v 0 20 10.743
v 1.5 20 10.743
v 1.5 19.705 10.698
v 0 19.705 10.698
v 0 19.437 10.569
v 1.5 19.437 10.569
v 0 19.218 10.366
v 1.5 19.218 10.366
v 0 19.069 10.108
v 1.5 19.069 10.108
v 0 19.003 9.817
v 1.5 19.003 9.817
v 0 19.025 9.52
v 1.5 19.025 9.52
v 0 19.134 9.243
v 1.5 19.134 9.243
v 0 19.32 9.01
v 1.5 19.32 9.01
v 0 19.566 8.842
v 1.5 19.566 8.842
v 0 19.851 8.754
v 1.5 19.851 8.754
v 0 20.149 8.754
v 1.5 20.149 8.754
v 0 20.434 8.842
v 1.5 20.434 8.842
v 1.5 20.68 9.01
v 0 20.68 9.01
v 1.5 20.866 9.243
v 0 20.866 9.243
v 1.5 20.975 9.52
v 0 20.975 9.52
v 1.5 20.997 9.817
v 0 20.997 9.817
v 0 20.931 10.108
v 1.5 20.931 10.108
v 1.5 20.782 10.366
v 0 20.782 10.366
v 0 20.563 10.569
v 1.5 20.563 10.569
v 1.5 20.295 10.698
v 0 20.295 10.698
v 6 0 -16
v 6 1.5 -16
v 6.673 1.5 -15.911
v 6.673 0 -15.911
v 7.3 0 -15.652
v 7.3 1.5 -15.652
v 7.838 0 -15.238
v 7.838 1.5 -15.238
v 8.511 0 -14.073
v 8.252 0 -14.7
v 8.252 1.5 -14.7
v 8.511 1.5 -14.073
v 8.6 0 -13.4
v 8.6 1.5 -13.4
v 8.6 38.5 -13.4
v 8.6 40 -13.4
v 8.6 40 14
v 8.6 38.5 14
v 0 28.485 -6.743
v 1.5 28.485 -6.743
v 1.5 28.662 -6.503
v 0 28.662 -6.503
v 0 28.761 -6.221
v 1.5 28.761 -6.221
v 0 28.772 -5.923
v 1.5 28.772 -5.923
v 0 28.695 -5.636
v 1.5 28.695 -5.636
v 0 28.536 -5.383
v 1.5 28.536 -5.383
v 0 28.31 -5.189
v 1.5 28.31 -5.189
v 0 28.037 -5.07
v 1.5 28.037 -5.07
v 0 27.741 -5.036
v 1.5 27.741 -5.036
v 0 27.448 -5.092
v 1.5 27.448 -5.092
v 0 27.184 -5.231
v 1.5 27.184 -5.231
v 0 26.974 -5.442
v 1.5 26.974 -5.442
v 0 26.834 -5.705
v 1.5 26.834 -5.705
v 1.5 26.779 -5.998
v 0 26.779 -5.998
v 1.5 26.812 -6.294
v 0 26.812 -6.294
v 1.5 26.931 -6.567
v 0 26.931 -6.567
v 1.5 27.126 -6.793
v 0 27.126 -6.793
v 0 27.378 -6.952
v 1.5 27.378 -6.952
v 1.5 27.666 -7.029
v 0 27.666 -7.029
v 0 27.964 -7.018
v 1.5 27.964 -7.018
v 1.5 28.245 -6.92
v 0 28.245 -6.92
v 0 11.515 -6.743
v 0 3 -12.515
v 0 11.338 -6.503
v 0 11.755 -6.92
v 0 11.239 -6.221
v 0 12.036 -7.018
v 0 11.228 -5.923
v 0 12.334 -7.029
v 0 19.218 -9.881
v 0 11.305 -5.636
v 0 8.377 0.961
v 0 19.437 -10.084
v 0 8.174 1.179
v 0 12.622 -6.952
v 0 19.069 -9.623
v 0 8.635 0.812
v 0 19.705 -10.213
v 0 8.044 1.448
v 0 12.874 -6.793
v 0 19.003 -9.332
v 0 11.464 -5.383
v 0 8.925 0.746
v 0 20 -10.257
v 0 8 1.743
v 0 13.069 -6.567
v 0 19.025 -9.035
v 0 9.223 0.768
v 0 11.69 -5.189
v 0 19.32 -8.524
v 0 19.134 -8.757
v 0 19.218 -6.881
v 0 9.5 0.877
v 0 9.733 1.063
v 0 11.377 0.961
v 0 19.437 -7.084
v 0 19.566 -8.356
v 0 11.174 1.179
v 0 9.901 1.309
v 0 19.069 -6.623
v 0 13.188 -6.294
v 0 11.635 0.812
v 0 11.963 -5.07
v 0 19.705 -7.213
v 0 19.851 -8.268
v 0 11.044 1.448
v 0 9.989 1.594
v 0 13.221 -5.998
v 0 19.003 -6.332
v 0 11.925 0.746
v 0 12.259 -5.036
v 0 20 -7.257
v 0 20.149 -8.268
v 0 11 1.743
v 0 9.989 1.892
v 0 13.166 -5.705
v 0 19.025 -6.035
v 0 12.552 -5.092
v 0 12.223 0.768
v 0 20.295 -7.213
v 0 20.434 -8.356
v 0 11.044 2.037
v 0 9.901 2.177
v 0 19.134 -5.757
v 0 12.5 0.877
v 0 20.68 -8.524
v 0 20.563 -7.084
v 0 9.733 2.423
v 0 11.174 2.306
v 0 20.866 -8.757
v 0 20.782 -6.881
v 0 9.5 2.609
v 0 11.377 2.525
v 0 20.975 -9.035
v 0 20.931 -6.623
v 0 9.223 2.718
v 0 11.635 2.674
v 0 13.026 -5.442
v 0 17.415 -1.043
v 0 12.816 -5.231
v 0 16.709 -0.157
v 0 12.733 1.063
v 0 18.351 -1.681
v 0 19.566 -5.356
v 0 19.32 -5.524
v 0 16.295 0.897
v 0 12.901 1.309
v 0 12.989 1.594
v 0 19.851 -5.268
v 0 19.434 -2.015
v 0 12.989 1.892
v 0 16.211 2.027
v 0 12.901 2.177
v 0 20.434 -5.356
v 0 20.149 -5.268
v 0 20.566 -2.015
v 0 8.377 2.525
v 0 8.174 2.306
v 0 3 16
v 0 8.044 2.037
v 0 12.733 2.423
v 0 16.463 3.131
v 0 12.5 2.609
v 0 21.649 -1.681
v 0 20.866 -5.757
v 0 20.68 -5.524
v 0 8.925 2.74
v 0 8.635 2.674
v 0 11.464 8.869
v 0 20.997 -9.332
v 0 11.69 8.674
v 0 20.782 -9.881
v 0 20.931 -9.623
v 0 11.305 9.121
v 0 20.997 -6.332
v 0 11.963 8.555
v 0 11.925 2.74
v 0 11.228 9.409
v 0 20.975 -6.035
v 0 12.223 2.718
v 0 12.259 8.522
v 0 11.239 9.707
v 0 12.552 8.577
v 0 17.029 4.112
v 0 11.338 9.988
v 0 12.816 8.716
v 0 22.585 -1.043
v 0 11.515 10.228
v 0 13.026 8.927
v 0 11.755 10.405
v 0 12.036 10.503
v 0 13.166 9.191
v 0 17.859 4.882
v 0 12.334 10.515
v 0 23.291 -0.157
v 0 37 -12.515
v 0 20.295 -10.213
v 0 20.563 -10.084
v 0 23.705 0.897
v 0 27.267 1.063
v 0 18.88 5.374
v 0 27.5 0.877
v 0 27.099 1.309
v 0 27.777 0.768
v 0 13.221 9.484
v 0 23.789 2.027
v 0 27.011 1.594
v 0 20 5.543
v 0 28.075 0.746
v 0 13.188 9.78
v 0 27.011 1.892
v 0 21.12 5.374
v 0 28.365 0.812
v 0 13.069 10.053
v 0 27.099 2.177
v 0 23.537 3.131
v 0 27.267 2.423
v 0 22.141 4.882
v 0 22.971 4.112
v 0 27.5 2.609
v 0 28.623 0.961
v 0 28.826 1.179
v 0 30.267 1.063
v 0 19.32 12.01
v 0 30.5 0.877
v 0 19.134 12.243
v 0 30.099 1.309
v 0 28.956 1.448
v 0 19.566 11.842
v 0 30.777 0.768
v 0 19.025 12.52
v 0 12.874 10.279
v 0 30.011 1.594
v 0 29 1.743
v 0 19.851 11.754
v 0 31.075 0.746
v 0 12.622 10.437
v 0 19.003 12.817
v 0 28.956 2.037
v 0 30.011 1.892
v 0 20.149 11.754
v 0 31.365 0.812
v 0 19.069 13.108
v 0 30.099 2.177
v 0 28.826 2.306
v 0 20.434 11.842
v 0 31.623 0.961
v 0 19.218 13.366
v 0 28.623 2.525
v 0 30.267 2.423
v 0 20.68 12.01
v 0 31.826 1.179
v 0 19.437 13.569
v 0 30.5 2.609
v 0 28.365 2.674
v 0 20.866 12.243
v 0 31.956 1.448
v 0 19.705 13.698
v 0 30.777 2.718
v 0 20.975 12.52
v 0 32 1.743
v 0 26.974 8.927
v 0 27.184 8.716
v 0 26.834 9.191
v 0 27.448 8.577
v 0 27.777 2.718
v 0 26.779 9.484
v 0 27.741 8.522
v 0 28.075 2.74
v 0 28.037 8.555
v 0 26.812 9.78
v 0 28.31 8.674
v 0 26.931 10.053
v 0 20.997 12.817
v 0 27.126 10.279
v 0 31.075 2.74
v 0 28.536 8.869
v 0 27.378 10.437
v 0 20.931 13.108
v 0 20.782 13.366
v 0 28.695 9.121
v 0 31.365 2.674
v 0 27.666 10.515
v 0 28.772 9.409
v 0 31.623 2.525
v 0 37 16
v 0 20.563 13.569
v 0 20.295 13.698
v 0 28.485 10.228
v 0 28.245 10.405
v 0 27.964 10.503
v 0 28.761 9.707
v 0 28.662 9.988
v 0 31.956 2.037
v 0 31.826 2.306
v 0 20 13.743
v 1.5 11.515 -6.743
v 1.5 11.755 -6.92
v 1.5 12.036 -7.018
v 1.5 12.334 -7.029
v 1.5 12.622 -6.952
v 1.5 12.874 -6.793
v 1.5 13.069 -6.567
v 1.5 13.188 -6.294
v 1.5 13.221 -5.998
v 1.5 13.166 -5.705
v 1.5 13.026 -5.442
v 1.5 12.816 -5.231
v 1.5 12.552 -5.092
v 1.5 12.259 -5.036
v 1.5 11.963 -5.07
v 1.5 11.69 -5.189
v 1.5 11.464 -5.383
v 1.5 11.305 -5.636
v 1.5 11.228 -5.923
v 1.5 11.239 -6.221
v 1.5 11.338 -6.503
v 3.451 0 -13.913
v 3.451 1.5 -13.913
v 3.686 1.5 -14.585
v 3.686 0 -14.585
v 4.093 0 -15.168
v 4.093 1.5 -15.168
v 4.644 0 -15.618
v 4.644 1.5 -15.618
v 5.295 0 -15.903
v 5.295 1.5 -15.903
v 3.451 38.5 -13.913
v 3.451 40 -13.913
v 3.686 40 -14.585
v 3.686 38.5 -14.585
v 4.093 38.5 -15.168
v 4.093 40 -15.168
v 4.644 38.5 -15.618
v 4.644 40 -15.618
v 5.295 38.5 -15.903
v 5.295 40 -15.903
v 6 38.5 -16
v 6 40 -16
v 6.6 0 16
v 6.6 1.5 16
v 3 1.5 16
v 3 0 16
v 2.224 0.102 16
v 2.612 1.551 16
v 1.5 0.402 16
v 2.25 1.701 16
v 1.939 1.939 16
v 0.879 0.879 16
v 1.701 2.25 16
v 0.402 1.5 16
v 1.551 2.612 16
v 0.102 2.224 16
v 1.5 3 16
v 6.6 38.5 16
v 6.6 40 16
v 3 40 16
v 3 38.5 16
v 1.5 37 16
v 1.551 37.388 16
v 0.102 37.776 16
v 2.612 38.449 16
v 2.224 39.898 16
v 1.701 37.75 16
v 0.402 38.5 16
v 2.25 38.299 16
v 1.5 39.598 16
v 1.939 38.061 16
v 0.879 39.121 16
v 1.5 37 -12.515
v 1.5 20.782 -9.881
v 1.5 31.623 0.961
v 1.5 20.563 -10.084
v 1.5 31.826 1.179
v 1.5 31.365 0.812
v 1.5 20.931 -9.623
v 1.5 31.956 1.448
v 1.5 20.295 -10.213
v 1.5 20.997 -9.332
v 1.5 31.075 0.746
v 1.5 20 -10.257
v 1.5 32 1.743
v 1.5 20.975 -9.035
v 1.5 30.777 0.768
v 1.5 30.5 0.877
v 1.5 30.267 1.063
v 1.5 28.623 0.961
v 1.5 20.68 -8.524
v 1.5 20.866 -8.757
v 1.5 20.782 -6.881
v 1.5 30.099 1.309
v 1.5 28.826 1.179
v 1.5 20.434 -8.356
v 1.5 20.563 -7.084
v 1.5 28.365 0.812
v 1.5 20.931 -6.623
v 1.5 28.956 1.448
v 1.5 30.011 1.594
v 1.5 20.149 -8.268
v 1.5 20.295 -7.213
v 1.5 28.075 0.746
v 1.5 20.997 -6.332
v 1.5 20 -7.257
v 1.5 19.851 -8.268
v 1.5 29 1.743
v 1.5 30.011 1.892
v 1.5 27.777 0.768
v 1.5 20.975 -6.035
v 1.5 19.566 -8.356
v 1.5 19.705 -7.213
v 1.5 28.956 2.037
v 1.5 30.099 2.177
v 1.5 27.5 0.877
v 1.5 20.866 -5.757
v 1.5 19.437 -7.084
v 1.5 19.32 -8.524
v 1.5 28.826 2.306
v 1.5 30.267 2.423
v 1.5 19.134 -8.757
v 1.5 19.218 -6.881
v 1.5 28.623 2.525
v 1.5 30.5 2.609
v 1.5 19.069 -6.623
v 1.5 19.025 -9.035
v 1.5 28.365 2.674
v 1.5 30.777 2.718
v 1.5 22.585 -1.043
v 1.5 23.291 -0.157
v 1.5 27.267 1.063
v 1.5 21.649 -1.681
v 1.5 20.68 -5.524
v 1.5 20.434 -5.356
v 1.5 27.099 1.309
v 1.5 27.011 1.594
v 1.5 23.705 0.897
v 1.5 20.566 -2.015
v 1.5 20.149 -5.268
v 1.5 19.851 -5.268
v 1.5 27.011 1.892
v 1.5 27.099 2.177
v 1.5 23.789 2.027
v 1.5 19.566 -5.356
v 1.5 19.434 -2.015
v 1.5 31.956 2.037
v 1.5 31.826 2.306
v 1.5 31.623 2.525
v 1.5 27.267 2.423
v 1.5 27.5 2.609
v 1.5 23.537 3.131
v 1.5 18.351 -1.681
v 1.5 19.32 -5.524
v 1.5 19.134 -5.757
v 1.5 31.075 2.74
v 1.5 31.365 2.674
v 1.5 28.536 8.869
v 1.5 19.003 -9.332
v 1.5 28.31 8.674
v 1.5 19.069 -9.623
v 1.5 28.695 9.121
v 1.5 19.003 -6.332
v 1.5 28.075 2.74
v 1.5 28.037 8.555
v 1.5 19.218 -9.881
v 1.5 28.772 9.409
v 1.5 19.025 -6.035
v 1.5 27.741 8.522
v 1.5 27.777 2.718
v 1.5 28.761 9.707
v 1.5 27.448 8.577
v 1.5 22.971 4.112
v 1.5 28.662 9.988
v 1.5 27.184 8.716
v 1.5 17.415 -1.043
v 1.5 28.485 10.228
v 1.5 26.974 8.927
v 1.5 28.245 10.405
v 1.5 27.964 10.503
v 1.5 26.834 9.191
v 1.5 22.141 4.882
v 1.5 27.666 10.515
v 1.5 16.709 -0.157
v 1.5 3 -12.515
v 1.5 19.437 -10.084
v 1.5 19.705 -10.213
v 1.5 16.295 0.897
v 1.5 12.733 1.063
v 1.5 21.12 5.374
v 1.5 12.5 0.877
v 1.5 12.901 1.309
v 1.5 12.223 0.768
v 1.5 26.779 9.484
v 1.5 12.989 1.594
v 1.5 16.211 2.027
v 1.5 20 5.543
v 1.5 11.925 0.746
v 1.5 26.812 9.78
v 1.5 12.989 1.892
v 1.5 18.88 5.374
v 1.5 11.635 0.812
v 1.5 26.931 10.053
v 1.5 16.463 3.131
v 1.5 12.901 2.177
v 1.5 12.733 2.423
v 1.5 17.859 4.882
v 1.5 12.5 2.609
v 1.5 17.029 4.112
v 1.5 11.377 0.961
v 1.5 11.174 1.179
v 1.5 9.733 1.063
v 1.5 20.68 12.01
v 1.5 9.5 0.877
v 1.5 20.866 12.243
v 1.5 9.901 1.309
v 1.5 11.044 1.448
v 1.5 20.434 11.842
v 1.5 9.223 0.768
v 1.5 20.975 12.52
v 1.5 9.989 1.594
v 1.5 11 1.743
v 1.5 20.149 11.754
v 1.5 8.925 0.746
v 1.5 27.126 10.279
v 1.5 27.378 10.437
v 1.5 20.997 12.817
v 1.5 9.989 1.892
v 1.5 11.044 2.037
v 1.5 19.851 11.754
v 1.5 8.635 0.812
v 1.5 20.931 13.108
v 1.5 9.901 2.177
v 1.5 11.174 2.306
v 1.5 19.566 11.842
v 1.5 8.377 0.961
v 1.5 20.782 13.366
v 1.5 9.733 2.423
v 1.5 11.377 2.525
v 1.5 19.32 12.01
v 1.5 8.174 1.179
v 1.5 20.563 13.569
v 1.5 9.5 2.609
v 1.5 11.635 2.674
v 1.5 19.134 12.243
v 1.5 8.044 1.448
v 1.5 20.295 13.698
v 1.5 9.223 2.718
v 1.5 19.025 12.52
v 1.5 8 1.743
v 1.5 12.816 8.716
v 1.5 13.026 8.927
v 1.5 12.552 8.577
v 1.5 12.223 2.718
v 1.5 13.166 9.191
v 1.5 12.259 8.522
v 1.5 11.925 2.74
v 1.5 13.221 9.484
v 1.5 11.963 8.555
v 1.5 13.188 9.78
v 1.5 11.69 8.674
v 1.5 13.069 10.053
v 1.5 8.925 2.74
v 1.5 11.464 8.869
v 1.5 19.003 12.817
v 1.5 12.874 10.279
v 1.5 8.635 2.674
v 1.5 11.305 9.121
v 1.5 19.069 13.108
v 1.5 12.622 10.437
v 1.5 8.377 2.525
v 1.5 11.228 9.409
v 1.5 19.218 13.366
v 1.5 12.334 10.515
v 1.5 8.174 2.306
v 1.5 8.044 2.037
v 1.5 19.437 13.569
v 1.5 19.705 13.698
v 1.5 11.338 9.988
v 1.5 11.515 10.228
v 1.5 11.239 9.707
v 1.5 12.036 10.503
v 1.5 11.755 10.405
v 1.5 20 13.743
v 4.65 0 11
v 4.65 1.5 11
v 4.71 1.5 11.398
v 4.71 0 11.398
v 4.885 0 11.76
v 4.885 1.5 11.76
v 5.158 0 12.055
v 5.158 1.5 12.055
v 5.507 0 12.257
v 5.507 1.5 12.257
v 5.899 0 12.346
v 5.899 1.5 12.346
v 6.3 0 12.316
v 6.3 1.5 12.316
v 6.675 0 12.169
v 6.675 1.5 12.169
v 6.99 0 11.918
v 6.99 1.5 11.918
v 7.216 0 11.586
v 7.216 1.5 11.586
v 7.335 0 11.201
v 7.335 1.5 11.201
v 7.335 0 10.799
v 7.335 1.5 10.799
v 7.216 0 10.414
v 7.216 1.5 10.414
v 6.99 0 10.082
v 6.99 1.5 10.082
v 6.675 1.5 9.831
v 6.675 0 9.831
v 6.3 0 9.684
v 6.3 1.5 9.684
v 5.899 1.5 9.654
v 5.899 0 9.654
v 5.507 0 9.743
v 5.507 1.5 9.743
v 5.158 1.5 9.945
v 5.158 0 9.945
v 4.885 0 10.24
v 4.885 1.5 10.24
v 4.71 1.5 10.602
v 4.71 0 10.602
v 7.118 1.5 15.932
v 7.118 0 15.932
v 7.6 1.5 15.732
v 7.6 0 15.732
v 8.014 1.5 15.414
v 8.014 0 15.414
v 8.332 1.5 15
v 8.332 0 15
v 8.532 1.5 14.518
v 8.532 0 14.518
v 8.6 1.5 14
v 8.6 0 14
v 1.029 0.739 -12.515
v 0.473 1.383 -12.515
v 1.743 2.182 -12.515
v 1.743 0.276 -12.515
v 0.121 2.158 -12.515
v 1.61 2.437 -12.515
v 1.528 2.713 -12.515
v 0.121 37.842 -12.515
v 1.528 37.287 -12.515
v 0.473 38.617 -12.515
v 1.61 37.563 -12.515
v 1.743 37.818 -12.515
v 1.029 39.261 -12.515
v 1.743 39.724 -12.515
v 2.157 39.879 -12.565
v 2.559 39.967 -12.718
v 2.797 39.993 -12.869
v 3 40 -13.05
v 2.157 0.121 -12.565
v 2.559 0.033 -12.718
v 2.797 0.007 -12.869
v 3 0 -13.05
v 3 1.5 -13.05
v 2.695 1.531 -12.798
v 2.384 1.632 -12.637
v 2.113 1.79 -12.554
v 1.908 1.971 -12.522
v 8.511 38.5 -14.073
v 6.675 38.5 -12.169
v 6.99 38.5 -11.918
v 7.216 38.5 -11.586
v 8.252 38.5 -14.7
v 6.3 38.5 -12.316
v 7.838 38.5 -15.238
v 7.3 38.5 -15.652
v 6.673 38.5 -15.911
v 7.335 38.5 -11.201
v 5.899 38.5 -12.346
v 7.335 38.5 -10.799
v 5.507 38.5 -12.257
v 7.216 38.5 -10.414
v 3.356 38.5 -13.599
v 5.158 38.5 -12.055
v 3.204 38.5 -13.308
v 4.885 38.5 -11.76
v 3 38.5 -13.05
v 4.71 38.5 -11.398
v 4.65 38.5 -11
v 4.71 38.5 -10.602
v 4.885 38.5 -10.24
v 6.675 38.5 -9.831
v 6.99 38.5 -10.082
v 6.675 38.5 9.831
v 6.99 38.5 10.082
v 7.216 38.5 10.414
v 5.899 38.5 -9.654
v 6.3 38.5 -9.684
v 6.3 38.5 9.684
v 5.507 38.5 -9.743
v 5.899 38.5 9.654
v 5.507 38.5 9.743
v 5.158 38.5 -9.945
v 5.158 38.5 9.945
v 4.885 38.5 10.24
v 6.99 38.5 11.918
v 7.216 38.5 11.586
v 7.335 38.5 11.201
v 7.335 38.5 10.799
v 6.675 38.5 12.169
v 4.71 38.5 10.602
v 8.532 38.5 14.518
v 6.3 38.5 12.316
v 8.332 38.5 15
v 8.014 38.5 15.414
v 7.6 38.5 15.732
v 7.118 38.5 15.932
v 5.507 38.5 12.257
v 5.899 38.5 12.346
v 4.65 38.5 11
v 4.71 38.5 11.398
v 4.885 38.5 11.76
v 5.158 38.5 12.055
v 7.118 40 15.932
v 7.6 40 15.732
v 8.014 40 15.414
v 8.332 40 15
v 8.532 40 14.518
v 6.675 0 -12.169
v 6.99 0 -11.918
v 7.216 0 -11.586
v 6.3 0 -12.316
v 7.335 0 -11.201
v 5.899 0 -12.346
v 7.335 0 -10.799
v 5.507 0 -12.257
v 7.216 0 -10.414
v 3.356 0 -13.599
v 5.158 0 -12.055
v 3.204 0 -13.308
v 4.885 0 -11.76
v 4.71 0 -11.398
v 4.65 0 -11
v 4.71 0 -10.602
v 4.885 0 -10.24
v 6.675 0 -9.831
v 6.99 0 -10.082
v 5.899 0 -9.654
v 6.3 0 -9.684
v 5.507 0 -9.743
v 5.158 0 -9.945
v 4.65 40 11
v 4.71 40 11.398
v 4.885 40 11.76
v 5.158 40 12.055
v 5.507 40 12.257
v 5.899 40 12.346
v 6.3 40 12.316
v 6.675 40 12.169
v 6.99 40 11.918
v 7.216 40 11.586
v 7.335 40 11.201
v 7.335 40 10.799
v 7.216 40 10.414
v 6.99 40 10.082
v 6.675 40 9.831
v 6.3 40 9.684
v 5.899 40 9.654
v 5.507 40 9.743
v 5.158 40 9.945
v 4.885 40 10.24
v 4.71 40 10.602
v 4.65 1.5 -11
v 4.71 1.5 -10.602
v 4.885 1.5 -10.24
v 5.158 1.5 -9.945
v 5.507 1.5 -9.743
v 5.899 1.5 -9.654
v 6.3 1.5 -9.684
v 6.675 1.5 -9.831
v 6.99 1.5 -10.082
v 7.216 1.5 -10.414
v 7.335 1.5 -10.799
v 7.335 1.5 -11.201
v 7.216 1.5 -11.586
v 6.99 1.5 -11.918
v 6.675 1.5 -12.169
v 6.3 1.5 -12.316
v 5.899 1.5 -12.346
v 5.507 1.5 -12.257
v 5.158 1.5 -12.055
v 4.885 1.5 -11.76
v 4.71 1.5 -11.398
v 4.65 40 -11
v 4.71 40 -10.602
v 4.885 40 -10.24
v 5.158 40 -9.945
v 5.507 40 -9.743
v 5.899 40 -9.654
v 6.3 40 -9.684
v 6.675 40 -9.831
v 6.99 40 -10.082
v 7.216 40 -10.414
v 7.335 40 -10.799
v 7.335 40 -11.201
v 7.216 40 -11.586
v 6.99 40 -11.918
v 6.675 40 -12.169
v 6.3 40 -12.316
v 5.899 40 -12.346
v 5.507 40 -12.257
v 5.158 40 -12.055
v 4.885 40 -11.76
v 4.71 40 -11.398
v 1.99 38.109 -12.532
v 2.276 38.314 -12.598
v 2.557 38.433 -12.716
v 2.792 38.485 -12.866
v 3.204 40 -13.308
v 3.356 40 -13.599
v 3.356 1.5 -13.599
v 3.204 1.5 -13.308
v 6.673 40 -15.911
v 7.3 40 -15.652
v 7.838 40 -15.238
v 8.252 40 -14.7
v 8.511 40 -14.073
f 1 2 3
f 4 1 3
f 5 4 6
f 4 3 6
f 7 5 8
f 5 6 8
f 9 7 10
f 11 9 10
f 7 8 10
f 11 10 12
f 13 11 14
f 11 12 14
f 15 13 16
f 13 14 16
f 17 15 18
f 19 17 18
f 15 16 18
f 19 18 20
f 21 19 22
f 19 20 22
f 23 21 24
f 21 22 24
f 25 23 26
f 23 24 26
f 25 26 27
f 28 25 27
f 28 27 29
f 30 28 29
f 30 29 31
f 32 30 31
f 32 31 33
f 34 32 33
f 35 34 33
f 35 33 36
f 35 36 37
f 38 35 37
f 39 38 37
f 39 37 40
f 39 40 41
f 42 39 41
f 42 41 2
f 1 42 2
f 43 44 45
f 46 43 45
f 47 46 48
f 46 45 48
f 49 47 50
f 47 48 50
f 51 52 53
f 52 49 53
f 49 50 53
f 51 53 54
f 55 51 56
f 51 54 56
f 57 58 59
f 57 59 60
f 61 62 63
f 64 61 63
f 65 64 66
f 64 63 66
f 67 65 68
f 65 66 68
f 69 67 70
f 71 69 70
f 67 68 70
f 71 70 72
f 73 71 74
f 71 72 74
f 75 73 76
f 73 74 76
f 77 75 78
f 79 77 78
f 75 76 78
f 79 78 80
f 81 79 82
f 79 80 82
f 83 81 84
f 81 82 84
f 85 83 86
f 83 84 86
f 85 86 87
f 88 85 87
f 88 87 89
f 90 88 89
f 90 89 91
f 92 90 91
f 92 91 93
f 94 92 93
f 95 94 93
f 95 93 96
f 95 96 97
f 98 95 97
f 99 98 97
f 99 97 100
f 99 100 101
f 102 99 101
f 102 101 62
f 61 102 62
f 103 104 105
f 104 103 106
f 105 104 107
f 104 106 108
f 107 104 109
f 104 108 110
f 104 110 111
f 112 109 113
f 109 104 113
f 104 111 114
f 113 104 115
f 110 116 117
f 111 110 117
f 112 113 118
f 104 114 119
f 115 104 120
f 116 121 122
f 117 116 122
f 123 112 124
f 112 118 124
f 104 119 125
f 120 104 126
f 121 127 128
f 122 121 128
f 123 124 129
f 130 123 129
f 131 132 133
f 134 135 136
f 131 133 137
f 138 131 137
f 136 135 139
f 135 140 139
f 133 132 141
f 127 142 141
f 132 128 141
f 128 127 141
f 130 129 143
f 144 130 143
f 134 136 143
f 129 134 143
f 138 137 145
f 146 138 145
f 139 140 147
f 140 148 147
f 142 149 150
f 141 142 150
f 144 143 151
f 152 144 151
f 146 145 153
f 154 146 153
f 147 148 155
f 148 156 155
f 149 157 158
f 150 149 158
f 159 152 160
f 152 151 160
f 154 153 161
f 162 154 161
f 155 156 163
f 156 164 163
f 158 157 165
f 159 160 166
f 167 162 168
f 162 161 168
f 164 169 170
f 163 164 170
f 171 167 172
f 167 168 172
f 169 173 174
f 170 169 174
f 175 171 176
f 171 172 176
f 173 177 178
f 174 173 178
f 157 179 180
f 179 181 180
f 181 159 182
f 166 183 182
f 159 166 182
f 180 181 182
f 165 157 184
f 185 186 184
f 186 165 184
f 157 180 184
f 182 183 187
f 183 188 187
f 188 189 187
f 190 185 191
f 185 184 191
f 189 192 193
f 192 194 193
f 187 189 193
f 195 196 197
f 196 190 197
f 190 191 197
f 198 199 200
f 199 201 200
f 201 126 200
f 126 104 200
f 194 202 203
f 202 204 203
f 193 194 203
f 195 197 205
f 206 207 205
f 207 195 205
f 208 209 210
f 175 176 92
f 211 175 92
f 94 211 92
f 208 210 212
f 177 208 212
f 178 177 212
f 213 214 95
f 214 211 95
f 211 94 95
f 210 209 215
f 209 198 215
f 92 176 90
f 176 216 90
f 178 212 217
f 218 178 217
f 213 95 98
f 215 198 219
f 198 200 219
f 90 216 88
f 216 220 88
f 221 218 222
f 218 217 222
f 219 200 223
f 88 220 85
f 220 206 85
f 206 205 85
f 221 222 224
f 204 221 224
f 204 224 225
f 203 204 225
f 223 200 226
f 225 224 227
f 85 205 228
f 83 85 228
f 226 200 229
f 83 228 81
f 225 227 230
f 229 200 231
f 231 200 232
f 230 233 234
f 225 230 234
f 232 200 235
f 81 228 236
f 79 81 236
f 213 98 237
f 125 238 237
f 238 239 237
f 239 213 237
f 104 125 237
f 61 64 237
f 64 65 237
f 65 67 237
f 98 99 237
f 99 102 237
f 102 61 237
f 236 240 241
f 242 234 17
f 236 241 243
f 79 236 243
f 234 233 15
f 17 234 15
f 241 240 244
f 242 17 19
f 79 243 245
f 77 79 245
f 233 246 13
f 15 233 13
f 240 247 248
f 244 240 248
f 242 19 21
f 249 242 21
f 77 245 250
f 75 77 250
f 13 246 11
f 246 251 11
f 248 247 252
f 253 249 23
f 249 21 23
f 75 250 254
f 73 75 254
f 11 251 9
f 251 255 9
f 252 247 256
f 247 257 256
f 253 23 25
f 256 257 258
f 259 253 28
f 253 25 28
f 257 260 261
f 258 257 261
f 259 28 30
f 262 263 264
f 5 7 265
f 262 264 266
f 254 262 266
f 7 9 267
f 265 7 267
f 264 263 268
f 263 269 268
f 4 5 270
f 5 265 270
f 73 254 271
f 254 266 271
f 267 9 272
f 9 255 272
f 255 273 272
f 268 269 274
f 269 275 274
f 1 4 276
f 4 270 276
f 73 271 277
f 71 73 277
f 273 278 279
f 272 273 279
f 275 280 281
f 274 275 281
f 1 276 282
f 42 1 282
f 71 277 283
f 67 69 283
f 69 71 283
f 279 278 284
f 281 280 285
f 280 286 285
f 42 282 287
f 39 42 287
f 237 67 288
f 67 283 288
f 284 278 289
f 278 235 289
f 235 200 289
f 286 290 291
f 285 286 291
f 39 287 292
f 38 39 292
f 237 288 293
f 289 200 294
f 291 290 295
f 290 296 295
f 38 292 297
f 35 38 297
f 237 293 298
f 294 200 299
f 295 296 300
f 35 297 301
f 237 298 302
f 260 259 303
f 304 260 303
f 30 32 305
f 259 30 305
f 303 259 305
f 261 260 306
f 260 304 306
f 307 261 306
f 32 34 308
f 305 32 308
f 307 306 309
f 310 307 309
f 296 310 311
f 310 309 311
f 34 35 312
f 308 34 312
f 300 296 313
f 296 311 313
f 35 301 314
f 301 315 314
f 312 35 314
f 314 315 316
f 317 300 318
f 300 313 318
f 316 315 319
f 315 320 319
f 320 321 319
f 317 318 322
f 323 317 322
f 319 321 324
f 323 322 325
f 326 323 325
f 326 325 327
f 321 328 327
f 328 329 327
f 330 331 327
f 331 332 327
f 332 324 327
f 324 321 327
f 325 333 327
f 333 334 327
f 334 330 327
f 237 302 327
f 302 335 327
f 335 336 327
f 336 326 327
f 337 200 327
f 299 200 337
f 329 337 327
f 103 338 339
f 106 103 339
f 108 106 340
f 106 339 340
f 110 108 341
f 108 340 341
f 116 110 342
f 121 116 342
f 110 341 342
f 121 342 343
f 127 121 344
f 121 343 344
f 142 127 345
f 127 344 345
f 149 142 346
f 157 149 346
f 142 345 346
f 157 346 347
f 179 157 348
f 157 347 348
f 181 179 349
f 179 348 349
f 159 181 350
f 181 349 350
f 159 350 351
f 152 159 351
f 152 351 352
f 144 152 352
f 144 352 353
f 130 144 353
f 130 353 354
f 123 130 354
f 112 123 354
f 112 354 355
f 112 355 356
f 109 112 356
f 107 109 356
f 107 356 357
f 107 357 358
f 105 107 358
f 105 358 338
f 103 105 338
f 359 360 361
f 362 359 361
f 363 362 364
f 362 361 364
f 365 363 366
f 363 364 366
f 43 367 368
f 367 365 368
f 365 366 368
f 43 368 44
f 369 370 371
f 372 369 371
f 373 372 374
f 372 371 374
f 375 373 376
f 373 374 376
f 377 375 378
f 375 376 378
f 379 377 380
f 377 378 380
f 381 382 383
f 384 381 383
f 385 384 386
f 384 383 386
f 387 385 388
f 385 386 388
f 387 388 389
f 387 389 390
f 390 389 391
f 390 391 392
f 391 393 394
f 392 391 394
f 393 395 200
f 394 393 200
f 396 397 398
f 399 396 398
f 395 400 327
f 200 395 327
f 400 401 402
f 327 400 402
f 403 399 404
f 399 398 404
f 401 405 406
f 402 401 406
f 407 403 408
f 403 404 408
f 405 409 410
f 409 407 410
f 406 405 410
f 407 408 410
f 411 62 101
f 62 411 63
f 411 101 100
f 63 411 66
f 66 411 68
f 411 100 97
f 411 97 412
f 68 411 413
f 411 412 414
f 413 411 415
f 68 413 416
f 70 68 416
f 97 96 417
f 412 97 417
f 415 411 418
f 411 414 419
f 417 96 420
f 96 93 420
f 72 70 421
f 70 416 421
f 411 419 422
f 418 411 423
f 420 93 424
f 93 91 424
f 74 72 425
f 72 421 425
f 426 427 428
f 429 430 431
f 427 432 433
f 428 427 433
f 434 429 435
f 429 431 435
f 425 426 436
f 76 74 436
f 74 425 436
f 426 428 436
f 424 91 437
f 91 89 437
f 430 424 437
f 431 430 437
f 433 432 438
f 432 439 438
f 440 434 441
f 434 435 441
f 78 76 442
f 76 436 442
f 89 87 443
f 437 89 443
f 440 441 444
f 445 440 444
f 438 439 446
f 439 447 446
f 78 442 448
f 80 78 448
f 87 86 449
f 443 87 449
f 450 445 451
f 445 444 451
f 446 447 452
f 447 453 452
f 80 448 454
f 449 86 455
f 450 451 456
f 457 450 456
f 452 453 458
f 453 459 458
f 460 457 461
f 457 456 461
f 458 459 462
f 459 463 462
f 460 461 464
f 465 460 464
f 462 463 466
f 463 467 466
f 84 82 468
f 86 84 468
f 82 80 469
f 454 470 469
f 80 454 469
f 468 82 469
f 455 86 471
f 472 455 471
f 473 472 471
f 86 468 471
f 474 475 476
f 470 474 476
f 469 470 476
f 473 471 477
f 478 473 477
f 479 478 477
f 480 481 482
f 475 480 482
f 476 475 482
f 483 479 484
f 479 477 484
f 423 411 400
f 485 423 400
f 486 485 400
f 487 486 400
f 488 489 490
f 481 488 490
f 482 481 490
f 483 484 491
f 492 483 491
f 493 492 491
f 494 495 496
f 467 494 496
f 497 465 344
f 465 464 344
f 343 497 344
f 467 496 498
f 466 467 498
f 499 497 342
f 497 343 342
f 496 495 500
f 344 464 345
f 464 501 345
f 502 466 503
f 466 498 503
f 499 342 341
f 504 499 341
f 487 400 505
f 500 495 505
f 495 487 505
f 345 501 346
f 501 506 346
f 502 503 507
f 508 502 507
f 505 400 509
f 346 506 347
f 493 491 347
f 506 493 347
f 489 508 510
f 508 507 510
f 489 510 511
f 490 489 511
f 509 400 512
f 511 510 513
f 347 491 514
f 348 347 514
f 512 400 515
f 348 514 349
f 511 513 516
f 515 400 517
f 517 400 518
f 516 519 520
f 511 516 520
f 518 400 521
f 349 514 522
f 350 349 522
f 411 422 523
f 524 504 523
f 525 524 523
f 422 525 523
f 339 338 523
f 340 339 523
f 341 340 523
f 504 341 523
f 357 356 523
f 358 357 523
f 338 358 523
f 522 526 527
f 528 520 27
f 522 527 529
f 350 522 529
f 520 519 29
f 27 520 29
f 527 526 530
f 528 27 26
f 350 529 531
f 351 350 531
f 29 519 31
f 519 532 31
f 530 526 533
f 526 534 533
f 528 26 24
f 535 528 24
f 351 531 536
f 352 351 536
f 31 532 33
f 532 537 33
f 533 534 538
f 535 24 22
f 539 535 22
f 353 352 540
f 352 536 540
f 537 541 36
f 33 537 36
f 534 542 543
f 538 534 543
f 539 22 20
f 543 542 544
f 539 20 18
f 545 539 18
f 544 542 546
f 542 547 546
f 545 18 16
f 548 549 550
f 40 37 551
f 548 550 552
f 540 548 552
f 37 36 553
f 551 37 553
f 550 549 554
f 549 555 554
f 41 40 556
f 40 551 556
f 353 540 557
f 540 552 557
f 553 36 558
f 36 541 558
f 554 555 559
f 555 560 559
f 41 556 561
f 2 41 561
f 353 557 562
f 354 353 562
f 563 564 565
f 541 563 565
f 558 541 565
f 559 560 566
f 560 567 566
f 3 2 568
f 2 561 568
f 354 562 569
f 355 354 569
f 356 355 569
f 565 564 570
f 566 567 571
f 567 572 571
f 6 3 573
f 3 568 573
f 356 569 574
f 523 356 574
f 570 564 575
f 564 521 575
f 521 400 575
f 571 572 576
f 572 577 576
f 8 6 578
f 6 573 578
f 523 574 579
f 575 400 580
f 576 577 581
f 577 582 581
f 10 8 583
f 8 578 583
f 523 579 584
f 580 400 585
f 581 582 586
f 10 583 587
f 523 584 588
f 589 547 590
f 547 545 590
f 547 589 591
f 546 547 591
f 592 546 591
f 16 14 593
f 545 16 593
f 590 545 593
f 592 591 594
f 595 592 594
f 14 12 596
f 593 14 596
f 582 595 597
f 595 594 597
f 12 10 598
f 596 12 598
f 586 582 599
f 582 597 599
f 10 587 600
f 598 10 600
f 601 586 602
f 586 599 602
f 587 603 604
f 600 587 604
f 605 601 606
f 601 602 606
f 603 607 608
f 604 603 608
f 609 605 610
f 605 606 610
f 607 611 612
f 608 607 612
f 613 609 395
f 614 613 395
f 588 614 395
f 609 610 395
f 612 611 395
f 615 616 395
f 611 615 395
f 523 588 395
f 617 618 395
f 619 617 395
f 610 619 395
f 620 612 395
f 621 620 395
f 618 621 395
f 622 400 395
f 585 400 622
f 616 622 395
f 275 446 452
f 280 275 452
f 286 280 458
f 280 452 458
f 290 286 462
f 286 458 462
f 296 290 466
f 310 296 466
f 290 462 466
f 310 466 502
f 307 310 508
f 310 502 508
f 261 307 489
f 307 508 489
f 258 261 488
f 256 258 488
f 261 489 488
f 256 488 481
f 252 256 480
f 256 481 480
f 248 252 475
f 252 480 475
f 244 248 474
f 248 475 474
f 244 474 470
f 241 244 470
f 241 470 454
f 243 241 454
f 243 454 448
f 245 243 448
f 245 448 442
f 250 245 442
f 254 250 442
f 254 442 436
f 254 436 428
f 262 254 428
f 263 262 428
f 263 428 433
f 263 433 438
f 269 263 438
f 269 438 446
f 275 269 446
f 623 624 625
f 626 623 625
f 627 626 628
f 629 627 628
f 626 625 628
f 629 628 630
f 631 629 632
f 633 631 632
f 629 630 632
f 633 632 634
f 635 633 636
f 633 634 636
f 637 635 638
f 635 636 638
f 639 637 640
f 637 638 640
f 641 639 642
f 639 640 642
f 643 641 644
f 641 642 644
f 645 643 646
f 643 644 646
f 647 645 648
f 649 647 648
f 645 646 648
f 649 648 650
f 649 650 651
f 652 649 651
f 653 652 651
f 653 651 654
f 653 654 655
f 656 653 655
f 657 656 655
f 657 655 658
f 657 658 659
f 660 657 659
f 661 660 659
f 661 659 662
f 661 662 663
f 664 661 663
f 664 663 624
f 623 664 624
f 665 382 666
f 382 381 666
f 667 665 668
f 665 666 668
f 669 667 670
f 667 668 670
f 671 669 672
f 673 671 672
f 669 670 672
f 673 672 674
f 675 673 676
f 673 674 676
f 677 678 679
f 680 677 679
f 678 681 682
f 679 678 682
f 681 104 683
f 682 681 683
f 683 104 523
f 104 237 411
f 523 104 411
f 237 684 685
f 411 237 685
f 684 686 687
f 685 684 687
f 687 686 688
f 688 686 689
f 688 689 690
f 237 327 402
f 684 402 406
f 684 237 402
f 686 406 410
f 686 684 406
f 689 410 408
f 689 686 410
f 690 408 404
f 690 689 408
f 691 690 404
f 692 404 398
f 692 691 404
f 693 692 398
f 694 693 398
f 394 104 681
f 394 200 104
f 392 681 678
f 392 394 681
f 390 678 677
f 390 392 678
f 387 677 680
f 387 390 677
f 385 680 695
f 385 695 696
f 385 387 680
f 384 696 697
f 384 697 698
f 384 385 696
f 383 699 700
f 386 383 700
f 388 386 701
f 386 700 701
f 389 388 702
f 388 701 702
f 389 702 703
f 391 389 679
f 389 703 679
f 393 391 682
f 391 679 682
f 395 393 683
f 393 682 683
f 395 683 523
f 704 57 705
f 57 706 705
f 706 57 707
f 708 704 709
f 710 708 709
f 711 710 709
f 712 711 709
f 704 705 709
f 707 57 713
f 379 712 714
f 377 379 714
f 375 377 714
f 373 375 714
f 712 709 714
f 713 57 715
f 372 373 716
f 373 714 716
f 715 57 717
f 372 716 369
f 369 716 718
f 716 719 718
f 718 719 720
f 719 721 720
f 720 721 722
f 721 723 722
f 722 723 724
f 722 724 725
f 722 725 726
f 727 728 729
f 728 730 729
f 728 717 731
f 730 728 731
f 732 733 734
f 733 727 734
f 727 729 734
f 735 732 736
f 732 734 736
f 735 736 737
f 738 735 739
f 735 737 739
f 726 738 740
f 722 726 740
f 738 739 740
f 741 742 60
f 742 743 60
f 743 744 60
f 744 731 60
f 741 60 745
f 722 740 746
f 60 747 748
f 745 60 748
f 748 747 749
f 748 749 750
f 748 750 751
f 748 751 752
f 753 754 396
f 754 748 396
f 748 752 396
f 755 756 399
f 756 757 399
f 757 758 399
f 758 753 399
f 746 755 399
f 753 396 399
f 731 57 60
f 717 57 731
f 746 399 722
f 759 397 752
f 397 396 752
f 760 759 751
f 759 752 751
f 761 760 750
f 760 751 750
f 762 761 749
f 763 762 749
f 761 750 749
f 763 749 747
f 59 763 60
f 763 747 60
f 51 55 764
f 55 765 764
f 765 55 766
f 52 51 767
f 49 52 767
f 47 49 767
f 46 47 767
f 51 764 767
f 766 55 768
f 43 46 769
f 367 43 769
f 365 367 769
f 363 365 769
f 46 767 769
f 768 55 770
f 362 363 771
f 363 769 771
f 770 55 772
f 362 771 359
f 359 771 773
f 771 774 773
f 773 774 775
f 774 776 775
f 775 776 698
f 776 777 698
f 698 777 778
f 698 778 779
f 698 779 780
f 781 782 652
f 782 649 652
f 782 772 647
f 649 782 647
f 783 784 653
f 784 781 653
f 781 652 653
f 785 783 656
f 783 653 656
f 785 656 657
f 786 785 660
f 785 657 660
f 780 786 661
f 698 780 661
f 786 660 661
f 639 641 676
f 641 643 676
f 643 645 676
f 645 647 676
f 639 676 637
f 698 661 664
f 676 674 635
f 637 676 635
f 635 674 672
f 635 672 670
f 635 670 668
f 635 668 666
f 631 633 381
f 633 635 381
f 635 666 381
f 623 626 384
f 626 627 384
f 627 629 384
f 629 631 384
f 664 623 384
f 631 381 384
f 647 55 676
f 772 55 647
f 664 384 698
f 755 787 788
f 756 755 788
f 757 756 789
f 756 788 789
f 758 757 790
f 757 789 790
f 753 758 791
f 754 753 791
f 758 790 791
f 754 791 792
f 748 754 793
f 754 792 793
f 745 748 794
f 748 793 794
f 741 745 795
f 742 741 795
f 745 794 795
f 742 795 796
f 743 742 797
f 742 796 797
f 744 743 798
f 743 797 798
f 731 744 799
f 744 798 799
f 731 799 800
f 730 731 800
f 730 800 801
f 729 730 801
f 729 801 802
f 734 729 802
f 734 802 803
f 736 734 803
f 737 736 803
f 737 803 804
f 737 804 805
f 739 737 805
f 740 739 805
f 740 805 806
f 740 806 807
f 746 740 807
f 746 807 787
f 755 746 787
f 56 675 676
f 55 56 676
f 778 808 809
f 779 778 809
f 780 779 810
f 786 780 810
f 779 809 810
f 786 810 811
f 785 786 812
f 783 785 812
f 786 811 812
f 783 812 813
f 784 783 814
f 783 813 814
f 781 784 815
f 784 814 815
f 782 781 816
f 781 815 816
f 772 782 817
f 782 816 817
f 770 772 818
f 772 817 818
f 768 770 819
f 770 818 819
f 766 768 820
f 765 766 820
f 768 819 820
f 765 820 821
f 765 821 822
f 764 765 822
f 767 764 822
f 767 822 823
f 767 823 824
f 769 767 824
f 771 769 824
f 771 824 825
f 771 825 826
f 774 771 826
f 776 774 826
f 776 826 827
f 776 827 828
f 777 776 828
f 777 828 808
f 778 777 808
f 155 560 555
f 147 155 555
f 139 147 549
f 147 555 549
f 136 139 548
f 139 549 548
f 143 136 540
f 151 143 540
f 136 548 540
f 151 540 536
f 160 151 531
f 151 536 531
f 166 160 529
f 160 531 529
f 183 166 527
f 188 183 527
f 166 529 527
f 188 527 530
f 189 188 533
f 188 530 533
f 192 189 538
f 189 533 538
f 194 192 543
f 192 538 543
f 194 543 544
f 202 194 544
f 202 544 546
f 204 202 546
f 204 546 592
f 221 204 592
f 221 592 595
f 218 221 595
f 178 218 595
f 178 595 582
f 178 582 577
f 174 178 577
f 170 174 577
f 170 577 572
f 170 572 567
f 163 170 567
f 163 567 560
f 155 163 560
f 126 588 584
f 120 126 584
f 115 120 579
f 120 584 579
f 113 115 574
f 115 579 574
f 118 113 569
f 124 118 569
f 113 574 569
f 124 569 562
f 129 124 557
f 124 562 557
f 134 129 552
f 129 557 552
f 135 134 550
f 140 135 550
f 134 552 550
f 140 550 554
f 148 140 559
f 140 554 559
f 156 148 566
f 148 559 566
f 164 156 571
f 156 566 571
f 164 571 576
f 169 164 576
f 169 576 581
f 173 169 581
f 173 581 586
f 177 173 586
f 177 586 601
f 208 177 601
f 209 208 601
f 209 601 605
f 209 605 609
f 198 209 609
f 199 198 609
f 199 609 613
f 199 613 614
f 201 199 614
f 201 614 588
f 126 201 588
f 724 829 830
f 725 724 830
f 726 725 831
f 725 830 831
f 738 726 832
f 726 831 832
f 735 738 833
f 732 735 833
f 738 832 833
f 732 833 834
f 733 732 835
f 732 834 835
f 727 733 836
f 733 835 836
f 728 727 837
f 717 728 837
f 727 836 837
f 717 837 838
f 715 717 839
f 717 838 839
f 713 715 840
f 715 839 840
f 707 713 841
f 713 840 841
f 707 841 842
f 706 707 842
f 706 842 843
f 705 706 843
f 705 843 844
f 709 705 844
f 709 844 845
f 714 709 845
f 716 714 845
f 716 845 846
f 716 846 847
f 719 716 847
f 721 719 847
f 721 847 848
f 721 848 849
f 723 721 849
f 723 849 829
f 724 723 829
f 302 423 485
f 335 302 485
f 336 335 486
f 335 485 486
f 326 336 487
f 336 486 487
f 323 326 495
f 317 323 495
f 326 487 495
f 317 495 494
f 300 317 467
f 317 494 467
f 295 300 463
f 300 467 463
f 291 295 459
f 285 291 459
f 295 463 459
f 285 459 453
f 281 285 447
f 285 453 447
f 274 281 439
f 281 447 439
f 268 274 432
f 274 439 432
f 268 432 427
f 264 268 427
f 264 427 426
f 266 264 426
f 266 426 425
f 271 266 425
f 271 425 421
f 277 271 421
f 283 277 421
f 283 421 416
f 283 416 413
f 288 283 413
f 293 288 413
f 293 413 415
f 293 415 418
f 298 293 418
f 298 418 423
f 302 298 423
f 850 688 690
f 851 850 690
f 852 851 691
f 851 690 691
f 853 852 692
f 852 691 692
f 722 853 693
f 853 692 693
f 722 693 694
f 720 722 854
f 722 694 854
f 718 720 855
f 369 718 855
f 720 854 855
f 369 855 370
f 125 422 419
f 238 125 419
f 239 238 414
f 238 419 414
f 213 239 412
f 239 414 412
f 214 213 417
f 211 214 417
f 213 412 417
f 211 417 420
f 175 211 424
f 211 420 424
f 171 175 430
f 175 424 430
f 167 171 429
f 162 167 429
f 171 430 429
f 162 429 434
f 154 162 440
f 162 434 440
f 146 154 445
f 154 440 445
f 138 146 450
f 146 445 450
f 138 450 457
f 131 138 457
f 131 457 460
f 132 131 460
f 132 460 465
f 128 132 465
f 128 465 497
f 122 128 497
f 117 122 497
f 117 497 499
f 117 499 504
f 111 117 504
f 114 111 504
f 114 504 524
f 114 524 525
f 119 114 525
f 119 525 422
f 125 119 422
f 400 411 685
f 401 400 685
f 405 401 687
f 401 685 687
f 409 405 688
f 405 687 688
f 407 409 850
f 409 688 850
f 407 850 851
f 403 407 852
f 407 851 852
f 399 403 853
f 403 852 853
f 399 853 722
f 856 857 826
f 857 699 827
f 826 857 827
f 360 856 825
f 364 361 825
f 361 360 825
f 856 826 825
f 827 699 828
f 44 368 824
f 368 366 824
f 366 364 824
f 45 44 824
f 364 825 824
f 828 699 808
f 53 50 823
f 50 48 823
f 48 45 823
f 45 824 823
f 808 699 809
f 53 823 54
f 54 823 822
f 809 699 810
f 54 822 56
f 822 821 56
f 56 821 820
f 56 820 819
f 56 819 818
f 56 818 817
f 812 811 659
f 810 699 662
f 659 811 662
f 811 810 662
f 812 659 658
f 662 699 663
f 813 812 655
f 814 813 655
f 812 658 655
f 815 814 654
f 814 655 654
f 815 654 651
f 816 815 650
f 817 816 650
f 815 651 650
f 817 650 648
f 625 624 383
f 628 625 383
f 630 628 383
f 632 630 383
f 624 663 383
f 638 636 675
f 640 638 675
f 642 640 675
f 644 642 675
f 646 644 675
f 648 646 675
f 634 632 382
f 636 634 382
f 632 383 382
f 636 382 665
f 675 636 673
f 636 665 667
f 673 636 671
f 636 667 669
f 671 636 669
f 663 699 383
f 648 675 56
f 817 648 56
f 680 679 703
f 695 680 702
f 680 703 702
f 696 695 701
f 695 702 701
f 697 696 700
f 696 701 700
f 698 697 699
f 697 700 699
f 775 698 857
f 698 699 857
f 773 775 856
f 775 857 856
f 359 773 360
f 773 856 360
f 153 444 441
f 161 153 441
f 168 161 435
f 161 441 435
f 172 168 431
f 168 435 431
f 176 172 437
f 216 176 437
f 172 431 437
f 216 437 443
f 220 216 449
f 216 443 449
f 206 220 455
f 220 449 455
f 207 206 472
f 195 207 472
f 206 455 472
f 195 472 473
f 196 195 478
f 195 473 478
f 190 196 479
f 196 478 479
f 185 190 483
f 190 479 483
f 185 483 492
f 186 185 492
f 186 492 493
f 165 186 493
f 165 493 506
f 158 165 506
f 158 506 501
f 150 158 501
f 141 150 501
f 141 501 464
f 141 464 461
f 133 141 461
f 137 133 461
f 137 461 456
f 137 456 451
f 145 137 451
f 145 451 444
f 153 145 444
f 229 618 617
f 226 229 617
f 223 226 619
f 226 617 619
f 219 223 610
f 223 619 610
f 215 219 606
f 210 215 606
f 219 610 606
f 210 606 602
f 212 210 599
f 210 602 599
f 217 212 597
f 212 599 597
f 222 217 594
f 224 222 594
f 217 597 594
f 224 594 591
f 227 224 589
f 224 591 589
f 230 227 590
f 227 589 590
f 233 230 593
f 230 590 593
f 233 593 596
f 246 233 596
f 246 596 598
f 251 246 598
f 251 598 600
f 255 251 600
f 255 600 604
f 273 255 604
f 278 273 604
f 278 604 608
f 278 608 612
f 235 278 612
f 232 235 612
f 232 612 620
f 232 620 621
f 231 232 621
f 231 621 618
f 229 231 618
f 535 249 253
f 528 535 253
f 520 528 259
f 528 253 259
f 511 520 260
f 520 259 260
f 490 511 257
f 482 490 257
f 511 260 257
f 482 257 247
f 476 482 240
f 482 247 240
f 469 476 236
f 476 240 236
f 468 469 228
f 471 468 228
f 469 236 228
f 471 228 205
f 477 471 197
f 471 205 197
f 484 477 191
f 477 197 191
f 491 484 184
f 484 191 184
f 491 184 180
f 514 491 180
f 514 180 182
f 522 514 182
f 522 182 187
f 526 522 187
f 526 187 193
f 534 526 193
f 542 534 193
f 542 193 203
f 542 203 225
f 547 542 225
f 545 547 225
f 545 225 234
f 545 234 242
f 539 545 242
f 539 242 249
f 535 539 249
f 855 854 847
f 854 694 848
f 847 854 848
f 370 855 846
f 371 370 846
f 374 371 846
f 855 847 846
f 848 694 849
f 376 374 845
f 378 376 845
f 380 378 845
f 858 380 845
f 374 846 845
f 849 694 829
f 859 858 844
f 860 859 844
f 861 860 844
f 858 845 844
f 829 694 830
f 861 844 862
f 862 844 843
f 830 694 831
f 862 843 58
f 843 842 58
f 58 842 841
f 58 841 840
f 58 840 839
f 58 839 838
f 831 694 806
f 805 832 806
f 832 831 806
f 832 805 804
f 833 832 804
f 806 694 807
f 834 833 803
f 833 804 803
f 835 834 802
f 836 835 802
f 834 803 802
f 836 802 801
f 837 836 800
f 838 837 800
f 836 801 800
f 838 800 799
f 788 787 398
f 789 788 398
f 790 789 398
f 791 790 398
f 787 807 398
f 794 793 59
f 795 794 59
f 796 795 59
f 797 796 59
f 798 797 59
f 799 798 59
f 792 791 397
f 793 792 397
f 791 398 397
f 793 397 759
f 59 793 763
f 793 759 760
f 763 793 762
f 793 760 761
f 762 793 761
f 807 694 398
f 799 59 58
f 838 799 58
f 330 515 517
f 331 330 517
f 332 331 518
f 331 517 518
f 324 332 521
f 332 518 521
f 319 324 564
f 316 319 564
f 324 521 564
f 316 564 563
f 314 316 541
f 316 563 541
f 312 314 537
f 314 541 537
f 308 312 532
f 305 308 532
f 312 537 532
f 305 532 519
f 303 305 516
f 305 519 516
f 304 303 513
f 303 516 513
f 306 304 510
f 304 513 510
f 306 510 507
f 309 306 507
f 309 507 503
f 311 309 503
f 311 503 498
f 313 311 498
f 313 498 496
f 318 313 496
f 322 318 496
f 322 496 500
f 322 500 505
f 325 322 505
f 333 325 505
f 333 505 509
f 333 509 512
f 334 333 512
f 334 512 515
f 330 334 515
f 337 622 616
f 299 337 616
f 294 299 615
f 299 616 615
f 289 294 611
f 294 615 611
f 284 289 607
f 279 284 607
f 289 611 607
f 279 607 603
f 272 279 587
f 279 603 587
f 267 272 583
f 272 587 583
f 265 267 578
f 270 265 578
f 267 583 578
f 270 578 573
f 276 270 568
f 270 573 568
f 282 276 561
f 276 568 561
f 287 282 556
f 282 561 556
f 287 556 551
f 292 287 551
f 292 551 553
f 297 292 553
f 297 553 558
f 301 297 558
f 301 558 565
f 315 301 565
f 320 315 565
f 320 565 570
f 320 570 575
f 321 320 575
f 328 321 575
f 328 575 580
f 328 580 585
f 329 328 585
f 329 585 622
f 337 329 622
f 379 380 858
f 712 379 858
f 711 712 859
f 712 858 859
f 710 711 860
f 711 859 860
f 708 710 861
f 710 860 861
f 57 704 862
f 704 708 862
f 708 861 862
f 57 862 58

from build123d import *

# Parameters (mm, degrees)
BOSS_EXTRUDE1_DEPTH = 16
SKETCH2_R           = 1.35
CUT_EXTRUDE1_DEPTH  = 44.931310019
SKETCH4_R           = 1.742727666
CUT_EXTRUDE3_DEPTH  = 44.931310019
SKETCH3_R           = 3.8
CUT_EXTRUDE2_DEPTH  = 44.931310019
FILLET1_R           = 3
FILLET2_R           = 2
FILLET3_R           = 1.5
CUT_EXTRUDE4_REACH  = 45.662
SKETCH5_R           = 1
CIRPATTERN1_COUNT   = 8
SKETCH6_R           = 1
CUT_EXTRUDE5_DEPTH  = 44.662455396
CIRPATTERN2_COUNT   = 4


with BuildPart() as part:
    # Sketch1 → Boss-Extrude1 (new, symmetric)
    with BuildSketch(Plane.XY):
        Polygon((0, 0), (0, 40), (8.6, 40), (8.6, 38.5), (1.5, 38.5), (1.5, 1.5), (8.6, 1.5), (8.6, 0), align=None)
    extrude(amount=BOSS_EXTRUDE1_DEPTH, both=True)

    # Sketch2 → Cut-Extrude1 (cut, through all)
    with BuildSketch(Plane(origin=(0, 40, 0), x_dir=(1, 0, 0), z_dir=(0, 1, 0))):
        with Locations(Location((6, 11, 0), (0, 0, 180))):
            Circle(SKETCH2_R)
        with Locations(Location((6, -11, 0), (0, 0, 180))):
            Circle(SKETCH2_R)
    extrude(amount=-CUT_EXTRUDE1_DEPTH, mode=Mode.SUBTRACT)

    # Sketch4 → Cut-Extrude3 (cut, through all)
    with BuildSketch(Plane(origin=(0, 40, 0), x_dir=(1, 0, 0), z_dir=(0, 1, 0))):
        with BuildLine():
            Line((8.6, 16), (6, 16))
            ThreePointArc((6, 16), (7.838477631, 15.238477631), (8.6, 13.4))
            Line((8.6, 13.4), (8.6, 16))
        make_face()
        Polygon((0, 18.566066505), (0, 16), (1.742727666, 16), (6, 16), (8.6, 16), (8.6, 13.4), (10.428656455, 13.4), (10.428656455, 18.566066505), align=None)
        with BuildLine():
            ThreePointArc((3.485455332, 14.257272334), (3.476860875, 14.084409002), (3.451162273, 13.91325066))
            ThreePointArc((3.451162273, 13.91325066), (4.352949866, 15.41177182), (6, 16))
            Line((6, 16), (1.742727666, 16))
            ThreePointArc((1.742727666, 16), (2.975022216, 15.489566884), (3.485455332, 14.257272334))
        make_face()
        with Locations((1.742727666, 14.257272334)):
            Circle(SKETCH4_R)
        with BuildLine():
            Line((0, 16), (0, 14.257272334))
            ThreePointArc((0, 14.257272334), (0.510433116, 15.489566884), (1.742727666, 16))
            Line((1.742727666, 16), (0, 16))
        make_face()
        with BuildLine():
            Line((0, 12.514544668), (1.742727666, 12.514544668))
            ThreePointArc((1.742727666, 12.514544668), (0.510433116, 13.024977784), (0, 14.257272334))
            Line((0, 14.257272334), (0, 12.514544668))
        make_face()
    extrude(amount=-CUT_EXTRUDE3_DEPTH, mode=Mode.SUBTRACT)

    # Sketch3 → Cut-Extrude2 (cut, through all)
    with BuildSketch(Plane.ZY):
        with Locations((1.742727666, 20)):
            Circle(SKETCH3_R)
    extrude(amount=-CUT_EXTRUDE2_DEPTH, mode=Mode.SUBTRACT)

    # Fillet1
    fillet1_edges = [part.edges().sort_by_distance(p)[0] for p in [
        (0, 0, 1.742727666),
        (0, 40, 1.742727666),
    ]]
    fillet(fillet1_edges, radius=FILLET1_R)

    # Fillet2
    fillet2_edges = [part.edges().sort_by_distance(p)[0] for p in [
        (8.6, 39.25, 16),
        (8.6, 0.75, 16),
    ]]
    fillet(fillet2_edges, radius=FILLET2_R)

    # Fillet3
    fillet3_edges = [part.edges().sort_by_distance(p)[0] for p in [
        (1.5, 1.5, 1.742727666),
        (1.5, 38.5, 1.742727666),
    ]]
    fillet(fillet3_edges, radius=FILLET3_R)

    # Sketch5 → Cut-Extrude4 (cut, up to next)
    with BuildSketch(Plane(origin=(1.5, 0, 0), x_dir=(0, 0, -1), z_dir=(1, 0, 0)), mode=Mode.PRIVATE) as cut_extrude4_sk1:
        with Locations(Location((-1.742727666, 31, 0), (0, 0, 90))):
            Circle(SKETCH5_R)
    cut_extrude4_tool1 = extrude(cut_extrude4_sk1.sketch, amount=-CUT_EXTRUDE4_REACH, mode=Mode.PRIVATE) & part.part
    cut_extrude4 = cut_extrude4_tool1.solids().sort_by_distance((1.5, 31, 1.742728))[0]
    add(cut_extrude4, mode=Mode.SUBTRACT)

    # CirPattern1: Cut-Extrude4 ×8 about axis
    cirpattern1_axis = Axis((0, 20, 1.742727666), (1, 0, 0))
    for i in range(1, CIRPATTERN1_COUNT):
        add(cut_extrude4.rotate(cirpattern1_axis, i * 360 / CIRPATTERN1_COUNT), mode=Mode.SUBTRACT)

    # Sketch6 → Cut-Extrude5 (cut, through all)
    with BuildSketch(Plane(origin=(1.5, 0, 0), x_dir=(0, 0, -1), z_dir=(1, 0, 0))):
        with Locations(Location((-1.742727666, 28, 0), (0, 0, 90))):
            Circle(SKETCH6_R)
    cut_extrude5 = extrude(amount=-CUT_EXTRUDE5_DEPTH, mode=Mode.SUBTRACT)

    # CirPattern2: Cut-Extrude5 ×4 about axis
    cirpattern2_axis = Axis((0, 20, 1.742727666), (1, 0, 0))
    for i in range(1, CIRPATTERN2_COUNT):
        add(cut_extrude5.rotate(cirpattern2_axis, i * 360 / CIRPATTERN2_COUNT), mode=Mode.SUBTRACT)


solid = part.part
